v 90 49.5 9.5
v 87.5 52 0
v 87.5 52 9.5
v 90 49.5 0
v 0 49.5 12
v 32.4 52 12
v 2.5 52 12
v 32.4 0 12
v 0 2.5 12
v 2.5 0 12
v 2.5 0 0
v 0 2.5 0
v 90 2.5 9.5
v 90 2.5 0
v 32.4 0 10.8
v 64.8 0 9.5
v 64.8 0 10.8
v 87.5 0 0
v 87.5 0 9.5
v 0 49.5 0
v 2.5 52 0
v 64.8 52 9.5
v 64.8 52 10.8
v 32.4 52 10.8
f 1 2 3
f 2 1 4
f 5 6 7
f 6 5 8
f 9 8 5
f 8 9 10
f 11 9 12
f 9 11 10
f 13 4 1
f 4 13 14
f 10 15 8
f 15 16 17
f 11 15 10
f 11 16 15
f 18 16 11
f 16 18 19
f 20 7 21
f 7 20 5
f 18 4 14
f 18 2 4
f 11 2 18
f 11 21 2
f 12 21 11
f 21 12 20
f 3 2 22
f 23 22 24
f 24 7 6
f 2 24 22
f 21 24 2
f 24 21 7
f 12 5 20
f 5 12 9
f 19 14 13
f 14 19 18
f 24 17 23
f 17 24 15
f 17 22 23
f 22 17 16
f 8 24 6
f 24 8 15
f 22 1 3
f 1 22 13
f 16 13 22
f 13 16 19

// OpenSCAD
$fn = 32;

// ----------------------------------------------------------------------
// Stepped bar: twostep, 90 x 52 x 12/9.5 mm
// ----------------------------------------------------------------------

// --- parameters (mm) ---
bar_l = 90;               // bar length, X
bar_w = 52;               // bar width, Y
plate_t = 12;             // thickness of the thick zone, Z
thin_t = 9.5;             // thickness of the thin zone
corner_c = 2.5;           // corner chamfer of the bar
step_cut = 2.5;           // material removed from the thin zone
stair1_x = 32.4;          // position of the first stair
stair2_x = 64.8;          // position of the second stair
mid_t = 10.8;             // thickness of the middle zone
depth_1 = 1.2;            // depth of cut 1 from the top face
depth_2 = 2.5;            // depth of cut 2 from the top face

profile = [[2.5, 0], [87.5, 0], [90, 2.5], [90, 49.5], [87.5, 52], [2.5, 52], [0, 49.5], [0, 2.5]];  // primary outline, 8 points, counter clockwise
void_1 = [[32.4, -1], [64.8, -1], [64.8, 53], [32.4, 53]];  // first stair, 4 points
void_2 = [[64.8, -1], [91, -1], [91, 53], [64.8, 53]];  // second stair, 4 points

// --- the one profile operation ---
difference() {
  linear_extrude(height = plate_t) polygon(points = profile);
  translate([0, 0, plate_t - depth_1])
    linear_extrude(height = depth_1 + 1) polygon(points = void_1);
  translate([0, 0, plate_t - depth_2])
    linear_extrude(height = depth_2 + 1) polygon(points = void_2);
}
